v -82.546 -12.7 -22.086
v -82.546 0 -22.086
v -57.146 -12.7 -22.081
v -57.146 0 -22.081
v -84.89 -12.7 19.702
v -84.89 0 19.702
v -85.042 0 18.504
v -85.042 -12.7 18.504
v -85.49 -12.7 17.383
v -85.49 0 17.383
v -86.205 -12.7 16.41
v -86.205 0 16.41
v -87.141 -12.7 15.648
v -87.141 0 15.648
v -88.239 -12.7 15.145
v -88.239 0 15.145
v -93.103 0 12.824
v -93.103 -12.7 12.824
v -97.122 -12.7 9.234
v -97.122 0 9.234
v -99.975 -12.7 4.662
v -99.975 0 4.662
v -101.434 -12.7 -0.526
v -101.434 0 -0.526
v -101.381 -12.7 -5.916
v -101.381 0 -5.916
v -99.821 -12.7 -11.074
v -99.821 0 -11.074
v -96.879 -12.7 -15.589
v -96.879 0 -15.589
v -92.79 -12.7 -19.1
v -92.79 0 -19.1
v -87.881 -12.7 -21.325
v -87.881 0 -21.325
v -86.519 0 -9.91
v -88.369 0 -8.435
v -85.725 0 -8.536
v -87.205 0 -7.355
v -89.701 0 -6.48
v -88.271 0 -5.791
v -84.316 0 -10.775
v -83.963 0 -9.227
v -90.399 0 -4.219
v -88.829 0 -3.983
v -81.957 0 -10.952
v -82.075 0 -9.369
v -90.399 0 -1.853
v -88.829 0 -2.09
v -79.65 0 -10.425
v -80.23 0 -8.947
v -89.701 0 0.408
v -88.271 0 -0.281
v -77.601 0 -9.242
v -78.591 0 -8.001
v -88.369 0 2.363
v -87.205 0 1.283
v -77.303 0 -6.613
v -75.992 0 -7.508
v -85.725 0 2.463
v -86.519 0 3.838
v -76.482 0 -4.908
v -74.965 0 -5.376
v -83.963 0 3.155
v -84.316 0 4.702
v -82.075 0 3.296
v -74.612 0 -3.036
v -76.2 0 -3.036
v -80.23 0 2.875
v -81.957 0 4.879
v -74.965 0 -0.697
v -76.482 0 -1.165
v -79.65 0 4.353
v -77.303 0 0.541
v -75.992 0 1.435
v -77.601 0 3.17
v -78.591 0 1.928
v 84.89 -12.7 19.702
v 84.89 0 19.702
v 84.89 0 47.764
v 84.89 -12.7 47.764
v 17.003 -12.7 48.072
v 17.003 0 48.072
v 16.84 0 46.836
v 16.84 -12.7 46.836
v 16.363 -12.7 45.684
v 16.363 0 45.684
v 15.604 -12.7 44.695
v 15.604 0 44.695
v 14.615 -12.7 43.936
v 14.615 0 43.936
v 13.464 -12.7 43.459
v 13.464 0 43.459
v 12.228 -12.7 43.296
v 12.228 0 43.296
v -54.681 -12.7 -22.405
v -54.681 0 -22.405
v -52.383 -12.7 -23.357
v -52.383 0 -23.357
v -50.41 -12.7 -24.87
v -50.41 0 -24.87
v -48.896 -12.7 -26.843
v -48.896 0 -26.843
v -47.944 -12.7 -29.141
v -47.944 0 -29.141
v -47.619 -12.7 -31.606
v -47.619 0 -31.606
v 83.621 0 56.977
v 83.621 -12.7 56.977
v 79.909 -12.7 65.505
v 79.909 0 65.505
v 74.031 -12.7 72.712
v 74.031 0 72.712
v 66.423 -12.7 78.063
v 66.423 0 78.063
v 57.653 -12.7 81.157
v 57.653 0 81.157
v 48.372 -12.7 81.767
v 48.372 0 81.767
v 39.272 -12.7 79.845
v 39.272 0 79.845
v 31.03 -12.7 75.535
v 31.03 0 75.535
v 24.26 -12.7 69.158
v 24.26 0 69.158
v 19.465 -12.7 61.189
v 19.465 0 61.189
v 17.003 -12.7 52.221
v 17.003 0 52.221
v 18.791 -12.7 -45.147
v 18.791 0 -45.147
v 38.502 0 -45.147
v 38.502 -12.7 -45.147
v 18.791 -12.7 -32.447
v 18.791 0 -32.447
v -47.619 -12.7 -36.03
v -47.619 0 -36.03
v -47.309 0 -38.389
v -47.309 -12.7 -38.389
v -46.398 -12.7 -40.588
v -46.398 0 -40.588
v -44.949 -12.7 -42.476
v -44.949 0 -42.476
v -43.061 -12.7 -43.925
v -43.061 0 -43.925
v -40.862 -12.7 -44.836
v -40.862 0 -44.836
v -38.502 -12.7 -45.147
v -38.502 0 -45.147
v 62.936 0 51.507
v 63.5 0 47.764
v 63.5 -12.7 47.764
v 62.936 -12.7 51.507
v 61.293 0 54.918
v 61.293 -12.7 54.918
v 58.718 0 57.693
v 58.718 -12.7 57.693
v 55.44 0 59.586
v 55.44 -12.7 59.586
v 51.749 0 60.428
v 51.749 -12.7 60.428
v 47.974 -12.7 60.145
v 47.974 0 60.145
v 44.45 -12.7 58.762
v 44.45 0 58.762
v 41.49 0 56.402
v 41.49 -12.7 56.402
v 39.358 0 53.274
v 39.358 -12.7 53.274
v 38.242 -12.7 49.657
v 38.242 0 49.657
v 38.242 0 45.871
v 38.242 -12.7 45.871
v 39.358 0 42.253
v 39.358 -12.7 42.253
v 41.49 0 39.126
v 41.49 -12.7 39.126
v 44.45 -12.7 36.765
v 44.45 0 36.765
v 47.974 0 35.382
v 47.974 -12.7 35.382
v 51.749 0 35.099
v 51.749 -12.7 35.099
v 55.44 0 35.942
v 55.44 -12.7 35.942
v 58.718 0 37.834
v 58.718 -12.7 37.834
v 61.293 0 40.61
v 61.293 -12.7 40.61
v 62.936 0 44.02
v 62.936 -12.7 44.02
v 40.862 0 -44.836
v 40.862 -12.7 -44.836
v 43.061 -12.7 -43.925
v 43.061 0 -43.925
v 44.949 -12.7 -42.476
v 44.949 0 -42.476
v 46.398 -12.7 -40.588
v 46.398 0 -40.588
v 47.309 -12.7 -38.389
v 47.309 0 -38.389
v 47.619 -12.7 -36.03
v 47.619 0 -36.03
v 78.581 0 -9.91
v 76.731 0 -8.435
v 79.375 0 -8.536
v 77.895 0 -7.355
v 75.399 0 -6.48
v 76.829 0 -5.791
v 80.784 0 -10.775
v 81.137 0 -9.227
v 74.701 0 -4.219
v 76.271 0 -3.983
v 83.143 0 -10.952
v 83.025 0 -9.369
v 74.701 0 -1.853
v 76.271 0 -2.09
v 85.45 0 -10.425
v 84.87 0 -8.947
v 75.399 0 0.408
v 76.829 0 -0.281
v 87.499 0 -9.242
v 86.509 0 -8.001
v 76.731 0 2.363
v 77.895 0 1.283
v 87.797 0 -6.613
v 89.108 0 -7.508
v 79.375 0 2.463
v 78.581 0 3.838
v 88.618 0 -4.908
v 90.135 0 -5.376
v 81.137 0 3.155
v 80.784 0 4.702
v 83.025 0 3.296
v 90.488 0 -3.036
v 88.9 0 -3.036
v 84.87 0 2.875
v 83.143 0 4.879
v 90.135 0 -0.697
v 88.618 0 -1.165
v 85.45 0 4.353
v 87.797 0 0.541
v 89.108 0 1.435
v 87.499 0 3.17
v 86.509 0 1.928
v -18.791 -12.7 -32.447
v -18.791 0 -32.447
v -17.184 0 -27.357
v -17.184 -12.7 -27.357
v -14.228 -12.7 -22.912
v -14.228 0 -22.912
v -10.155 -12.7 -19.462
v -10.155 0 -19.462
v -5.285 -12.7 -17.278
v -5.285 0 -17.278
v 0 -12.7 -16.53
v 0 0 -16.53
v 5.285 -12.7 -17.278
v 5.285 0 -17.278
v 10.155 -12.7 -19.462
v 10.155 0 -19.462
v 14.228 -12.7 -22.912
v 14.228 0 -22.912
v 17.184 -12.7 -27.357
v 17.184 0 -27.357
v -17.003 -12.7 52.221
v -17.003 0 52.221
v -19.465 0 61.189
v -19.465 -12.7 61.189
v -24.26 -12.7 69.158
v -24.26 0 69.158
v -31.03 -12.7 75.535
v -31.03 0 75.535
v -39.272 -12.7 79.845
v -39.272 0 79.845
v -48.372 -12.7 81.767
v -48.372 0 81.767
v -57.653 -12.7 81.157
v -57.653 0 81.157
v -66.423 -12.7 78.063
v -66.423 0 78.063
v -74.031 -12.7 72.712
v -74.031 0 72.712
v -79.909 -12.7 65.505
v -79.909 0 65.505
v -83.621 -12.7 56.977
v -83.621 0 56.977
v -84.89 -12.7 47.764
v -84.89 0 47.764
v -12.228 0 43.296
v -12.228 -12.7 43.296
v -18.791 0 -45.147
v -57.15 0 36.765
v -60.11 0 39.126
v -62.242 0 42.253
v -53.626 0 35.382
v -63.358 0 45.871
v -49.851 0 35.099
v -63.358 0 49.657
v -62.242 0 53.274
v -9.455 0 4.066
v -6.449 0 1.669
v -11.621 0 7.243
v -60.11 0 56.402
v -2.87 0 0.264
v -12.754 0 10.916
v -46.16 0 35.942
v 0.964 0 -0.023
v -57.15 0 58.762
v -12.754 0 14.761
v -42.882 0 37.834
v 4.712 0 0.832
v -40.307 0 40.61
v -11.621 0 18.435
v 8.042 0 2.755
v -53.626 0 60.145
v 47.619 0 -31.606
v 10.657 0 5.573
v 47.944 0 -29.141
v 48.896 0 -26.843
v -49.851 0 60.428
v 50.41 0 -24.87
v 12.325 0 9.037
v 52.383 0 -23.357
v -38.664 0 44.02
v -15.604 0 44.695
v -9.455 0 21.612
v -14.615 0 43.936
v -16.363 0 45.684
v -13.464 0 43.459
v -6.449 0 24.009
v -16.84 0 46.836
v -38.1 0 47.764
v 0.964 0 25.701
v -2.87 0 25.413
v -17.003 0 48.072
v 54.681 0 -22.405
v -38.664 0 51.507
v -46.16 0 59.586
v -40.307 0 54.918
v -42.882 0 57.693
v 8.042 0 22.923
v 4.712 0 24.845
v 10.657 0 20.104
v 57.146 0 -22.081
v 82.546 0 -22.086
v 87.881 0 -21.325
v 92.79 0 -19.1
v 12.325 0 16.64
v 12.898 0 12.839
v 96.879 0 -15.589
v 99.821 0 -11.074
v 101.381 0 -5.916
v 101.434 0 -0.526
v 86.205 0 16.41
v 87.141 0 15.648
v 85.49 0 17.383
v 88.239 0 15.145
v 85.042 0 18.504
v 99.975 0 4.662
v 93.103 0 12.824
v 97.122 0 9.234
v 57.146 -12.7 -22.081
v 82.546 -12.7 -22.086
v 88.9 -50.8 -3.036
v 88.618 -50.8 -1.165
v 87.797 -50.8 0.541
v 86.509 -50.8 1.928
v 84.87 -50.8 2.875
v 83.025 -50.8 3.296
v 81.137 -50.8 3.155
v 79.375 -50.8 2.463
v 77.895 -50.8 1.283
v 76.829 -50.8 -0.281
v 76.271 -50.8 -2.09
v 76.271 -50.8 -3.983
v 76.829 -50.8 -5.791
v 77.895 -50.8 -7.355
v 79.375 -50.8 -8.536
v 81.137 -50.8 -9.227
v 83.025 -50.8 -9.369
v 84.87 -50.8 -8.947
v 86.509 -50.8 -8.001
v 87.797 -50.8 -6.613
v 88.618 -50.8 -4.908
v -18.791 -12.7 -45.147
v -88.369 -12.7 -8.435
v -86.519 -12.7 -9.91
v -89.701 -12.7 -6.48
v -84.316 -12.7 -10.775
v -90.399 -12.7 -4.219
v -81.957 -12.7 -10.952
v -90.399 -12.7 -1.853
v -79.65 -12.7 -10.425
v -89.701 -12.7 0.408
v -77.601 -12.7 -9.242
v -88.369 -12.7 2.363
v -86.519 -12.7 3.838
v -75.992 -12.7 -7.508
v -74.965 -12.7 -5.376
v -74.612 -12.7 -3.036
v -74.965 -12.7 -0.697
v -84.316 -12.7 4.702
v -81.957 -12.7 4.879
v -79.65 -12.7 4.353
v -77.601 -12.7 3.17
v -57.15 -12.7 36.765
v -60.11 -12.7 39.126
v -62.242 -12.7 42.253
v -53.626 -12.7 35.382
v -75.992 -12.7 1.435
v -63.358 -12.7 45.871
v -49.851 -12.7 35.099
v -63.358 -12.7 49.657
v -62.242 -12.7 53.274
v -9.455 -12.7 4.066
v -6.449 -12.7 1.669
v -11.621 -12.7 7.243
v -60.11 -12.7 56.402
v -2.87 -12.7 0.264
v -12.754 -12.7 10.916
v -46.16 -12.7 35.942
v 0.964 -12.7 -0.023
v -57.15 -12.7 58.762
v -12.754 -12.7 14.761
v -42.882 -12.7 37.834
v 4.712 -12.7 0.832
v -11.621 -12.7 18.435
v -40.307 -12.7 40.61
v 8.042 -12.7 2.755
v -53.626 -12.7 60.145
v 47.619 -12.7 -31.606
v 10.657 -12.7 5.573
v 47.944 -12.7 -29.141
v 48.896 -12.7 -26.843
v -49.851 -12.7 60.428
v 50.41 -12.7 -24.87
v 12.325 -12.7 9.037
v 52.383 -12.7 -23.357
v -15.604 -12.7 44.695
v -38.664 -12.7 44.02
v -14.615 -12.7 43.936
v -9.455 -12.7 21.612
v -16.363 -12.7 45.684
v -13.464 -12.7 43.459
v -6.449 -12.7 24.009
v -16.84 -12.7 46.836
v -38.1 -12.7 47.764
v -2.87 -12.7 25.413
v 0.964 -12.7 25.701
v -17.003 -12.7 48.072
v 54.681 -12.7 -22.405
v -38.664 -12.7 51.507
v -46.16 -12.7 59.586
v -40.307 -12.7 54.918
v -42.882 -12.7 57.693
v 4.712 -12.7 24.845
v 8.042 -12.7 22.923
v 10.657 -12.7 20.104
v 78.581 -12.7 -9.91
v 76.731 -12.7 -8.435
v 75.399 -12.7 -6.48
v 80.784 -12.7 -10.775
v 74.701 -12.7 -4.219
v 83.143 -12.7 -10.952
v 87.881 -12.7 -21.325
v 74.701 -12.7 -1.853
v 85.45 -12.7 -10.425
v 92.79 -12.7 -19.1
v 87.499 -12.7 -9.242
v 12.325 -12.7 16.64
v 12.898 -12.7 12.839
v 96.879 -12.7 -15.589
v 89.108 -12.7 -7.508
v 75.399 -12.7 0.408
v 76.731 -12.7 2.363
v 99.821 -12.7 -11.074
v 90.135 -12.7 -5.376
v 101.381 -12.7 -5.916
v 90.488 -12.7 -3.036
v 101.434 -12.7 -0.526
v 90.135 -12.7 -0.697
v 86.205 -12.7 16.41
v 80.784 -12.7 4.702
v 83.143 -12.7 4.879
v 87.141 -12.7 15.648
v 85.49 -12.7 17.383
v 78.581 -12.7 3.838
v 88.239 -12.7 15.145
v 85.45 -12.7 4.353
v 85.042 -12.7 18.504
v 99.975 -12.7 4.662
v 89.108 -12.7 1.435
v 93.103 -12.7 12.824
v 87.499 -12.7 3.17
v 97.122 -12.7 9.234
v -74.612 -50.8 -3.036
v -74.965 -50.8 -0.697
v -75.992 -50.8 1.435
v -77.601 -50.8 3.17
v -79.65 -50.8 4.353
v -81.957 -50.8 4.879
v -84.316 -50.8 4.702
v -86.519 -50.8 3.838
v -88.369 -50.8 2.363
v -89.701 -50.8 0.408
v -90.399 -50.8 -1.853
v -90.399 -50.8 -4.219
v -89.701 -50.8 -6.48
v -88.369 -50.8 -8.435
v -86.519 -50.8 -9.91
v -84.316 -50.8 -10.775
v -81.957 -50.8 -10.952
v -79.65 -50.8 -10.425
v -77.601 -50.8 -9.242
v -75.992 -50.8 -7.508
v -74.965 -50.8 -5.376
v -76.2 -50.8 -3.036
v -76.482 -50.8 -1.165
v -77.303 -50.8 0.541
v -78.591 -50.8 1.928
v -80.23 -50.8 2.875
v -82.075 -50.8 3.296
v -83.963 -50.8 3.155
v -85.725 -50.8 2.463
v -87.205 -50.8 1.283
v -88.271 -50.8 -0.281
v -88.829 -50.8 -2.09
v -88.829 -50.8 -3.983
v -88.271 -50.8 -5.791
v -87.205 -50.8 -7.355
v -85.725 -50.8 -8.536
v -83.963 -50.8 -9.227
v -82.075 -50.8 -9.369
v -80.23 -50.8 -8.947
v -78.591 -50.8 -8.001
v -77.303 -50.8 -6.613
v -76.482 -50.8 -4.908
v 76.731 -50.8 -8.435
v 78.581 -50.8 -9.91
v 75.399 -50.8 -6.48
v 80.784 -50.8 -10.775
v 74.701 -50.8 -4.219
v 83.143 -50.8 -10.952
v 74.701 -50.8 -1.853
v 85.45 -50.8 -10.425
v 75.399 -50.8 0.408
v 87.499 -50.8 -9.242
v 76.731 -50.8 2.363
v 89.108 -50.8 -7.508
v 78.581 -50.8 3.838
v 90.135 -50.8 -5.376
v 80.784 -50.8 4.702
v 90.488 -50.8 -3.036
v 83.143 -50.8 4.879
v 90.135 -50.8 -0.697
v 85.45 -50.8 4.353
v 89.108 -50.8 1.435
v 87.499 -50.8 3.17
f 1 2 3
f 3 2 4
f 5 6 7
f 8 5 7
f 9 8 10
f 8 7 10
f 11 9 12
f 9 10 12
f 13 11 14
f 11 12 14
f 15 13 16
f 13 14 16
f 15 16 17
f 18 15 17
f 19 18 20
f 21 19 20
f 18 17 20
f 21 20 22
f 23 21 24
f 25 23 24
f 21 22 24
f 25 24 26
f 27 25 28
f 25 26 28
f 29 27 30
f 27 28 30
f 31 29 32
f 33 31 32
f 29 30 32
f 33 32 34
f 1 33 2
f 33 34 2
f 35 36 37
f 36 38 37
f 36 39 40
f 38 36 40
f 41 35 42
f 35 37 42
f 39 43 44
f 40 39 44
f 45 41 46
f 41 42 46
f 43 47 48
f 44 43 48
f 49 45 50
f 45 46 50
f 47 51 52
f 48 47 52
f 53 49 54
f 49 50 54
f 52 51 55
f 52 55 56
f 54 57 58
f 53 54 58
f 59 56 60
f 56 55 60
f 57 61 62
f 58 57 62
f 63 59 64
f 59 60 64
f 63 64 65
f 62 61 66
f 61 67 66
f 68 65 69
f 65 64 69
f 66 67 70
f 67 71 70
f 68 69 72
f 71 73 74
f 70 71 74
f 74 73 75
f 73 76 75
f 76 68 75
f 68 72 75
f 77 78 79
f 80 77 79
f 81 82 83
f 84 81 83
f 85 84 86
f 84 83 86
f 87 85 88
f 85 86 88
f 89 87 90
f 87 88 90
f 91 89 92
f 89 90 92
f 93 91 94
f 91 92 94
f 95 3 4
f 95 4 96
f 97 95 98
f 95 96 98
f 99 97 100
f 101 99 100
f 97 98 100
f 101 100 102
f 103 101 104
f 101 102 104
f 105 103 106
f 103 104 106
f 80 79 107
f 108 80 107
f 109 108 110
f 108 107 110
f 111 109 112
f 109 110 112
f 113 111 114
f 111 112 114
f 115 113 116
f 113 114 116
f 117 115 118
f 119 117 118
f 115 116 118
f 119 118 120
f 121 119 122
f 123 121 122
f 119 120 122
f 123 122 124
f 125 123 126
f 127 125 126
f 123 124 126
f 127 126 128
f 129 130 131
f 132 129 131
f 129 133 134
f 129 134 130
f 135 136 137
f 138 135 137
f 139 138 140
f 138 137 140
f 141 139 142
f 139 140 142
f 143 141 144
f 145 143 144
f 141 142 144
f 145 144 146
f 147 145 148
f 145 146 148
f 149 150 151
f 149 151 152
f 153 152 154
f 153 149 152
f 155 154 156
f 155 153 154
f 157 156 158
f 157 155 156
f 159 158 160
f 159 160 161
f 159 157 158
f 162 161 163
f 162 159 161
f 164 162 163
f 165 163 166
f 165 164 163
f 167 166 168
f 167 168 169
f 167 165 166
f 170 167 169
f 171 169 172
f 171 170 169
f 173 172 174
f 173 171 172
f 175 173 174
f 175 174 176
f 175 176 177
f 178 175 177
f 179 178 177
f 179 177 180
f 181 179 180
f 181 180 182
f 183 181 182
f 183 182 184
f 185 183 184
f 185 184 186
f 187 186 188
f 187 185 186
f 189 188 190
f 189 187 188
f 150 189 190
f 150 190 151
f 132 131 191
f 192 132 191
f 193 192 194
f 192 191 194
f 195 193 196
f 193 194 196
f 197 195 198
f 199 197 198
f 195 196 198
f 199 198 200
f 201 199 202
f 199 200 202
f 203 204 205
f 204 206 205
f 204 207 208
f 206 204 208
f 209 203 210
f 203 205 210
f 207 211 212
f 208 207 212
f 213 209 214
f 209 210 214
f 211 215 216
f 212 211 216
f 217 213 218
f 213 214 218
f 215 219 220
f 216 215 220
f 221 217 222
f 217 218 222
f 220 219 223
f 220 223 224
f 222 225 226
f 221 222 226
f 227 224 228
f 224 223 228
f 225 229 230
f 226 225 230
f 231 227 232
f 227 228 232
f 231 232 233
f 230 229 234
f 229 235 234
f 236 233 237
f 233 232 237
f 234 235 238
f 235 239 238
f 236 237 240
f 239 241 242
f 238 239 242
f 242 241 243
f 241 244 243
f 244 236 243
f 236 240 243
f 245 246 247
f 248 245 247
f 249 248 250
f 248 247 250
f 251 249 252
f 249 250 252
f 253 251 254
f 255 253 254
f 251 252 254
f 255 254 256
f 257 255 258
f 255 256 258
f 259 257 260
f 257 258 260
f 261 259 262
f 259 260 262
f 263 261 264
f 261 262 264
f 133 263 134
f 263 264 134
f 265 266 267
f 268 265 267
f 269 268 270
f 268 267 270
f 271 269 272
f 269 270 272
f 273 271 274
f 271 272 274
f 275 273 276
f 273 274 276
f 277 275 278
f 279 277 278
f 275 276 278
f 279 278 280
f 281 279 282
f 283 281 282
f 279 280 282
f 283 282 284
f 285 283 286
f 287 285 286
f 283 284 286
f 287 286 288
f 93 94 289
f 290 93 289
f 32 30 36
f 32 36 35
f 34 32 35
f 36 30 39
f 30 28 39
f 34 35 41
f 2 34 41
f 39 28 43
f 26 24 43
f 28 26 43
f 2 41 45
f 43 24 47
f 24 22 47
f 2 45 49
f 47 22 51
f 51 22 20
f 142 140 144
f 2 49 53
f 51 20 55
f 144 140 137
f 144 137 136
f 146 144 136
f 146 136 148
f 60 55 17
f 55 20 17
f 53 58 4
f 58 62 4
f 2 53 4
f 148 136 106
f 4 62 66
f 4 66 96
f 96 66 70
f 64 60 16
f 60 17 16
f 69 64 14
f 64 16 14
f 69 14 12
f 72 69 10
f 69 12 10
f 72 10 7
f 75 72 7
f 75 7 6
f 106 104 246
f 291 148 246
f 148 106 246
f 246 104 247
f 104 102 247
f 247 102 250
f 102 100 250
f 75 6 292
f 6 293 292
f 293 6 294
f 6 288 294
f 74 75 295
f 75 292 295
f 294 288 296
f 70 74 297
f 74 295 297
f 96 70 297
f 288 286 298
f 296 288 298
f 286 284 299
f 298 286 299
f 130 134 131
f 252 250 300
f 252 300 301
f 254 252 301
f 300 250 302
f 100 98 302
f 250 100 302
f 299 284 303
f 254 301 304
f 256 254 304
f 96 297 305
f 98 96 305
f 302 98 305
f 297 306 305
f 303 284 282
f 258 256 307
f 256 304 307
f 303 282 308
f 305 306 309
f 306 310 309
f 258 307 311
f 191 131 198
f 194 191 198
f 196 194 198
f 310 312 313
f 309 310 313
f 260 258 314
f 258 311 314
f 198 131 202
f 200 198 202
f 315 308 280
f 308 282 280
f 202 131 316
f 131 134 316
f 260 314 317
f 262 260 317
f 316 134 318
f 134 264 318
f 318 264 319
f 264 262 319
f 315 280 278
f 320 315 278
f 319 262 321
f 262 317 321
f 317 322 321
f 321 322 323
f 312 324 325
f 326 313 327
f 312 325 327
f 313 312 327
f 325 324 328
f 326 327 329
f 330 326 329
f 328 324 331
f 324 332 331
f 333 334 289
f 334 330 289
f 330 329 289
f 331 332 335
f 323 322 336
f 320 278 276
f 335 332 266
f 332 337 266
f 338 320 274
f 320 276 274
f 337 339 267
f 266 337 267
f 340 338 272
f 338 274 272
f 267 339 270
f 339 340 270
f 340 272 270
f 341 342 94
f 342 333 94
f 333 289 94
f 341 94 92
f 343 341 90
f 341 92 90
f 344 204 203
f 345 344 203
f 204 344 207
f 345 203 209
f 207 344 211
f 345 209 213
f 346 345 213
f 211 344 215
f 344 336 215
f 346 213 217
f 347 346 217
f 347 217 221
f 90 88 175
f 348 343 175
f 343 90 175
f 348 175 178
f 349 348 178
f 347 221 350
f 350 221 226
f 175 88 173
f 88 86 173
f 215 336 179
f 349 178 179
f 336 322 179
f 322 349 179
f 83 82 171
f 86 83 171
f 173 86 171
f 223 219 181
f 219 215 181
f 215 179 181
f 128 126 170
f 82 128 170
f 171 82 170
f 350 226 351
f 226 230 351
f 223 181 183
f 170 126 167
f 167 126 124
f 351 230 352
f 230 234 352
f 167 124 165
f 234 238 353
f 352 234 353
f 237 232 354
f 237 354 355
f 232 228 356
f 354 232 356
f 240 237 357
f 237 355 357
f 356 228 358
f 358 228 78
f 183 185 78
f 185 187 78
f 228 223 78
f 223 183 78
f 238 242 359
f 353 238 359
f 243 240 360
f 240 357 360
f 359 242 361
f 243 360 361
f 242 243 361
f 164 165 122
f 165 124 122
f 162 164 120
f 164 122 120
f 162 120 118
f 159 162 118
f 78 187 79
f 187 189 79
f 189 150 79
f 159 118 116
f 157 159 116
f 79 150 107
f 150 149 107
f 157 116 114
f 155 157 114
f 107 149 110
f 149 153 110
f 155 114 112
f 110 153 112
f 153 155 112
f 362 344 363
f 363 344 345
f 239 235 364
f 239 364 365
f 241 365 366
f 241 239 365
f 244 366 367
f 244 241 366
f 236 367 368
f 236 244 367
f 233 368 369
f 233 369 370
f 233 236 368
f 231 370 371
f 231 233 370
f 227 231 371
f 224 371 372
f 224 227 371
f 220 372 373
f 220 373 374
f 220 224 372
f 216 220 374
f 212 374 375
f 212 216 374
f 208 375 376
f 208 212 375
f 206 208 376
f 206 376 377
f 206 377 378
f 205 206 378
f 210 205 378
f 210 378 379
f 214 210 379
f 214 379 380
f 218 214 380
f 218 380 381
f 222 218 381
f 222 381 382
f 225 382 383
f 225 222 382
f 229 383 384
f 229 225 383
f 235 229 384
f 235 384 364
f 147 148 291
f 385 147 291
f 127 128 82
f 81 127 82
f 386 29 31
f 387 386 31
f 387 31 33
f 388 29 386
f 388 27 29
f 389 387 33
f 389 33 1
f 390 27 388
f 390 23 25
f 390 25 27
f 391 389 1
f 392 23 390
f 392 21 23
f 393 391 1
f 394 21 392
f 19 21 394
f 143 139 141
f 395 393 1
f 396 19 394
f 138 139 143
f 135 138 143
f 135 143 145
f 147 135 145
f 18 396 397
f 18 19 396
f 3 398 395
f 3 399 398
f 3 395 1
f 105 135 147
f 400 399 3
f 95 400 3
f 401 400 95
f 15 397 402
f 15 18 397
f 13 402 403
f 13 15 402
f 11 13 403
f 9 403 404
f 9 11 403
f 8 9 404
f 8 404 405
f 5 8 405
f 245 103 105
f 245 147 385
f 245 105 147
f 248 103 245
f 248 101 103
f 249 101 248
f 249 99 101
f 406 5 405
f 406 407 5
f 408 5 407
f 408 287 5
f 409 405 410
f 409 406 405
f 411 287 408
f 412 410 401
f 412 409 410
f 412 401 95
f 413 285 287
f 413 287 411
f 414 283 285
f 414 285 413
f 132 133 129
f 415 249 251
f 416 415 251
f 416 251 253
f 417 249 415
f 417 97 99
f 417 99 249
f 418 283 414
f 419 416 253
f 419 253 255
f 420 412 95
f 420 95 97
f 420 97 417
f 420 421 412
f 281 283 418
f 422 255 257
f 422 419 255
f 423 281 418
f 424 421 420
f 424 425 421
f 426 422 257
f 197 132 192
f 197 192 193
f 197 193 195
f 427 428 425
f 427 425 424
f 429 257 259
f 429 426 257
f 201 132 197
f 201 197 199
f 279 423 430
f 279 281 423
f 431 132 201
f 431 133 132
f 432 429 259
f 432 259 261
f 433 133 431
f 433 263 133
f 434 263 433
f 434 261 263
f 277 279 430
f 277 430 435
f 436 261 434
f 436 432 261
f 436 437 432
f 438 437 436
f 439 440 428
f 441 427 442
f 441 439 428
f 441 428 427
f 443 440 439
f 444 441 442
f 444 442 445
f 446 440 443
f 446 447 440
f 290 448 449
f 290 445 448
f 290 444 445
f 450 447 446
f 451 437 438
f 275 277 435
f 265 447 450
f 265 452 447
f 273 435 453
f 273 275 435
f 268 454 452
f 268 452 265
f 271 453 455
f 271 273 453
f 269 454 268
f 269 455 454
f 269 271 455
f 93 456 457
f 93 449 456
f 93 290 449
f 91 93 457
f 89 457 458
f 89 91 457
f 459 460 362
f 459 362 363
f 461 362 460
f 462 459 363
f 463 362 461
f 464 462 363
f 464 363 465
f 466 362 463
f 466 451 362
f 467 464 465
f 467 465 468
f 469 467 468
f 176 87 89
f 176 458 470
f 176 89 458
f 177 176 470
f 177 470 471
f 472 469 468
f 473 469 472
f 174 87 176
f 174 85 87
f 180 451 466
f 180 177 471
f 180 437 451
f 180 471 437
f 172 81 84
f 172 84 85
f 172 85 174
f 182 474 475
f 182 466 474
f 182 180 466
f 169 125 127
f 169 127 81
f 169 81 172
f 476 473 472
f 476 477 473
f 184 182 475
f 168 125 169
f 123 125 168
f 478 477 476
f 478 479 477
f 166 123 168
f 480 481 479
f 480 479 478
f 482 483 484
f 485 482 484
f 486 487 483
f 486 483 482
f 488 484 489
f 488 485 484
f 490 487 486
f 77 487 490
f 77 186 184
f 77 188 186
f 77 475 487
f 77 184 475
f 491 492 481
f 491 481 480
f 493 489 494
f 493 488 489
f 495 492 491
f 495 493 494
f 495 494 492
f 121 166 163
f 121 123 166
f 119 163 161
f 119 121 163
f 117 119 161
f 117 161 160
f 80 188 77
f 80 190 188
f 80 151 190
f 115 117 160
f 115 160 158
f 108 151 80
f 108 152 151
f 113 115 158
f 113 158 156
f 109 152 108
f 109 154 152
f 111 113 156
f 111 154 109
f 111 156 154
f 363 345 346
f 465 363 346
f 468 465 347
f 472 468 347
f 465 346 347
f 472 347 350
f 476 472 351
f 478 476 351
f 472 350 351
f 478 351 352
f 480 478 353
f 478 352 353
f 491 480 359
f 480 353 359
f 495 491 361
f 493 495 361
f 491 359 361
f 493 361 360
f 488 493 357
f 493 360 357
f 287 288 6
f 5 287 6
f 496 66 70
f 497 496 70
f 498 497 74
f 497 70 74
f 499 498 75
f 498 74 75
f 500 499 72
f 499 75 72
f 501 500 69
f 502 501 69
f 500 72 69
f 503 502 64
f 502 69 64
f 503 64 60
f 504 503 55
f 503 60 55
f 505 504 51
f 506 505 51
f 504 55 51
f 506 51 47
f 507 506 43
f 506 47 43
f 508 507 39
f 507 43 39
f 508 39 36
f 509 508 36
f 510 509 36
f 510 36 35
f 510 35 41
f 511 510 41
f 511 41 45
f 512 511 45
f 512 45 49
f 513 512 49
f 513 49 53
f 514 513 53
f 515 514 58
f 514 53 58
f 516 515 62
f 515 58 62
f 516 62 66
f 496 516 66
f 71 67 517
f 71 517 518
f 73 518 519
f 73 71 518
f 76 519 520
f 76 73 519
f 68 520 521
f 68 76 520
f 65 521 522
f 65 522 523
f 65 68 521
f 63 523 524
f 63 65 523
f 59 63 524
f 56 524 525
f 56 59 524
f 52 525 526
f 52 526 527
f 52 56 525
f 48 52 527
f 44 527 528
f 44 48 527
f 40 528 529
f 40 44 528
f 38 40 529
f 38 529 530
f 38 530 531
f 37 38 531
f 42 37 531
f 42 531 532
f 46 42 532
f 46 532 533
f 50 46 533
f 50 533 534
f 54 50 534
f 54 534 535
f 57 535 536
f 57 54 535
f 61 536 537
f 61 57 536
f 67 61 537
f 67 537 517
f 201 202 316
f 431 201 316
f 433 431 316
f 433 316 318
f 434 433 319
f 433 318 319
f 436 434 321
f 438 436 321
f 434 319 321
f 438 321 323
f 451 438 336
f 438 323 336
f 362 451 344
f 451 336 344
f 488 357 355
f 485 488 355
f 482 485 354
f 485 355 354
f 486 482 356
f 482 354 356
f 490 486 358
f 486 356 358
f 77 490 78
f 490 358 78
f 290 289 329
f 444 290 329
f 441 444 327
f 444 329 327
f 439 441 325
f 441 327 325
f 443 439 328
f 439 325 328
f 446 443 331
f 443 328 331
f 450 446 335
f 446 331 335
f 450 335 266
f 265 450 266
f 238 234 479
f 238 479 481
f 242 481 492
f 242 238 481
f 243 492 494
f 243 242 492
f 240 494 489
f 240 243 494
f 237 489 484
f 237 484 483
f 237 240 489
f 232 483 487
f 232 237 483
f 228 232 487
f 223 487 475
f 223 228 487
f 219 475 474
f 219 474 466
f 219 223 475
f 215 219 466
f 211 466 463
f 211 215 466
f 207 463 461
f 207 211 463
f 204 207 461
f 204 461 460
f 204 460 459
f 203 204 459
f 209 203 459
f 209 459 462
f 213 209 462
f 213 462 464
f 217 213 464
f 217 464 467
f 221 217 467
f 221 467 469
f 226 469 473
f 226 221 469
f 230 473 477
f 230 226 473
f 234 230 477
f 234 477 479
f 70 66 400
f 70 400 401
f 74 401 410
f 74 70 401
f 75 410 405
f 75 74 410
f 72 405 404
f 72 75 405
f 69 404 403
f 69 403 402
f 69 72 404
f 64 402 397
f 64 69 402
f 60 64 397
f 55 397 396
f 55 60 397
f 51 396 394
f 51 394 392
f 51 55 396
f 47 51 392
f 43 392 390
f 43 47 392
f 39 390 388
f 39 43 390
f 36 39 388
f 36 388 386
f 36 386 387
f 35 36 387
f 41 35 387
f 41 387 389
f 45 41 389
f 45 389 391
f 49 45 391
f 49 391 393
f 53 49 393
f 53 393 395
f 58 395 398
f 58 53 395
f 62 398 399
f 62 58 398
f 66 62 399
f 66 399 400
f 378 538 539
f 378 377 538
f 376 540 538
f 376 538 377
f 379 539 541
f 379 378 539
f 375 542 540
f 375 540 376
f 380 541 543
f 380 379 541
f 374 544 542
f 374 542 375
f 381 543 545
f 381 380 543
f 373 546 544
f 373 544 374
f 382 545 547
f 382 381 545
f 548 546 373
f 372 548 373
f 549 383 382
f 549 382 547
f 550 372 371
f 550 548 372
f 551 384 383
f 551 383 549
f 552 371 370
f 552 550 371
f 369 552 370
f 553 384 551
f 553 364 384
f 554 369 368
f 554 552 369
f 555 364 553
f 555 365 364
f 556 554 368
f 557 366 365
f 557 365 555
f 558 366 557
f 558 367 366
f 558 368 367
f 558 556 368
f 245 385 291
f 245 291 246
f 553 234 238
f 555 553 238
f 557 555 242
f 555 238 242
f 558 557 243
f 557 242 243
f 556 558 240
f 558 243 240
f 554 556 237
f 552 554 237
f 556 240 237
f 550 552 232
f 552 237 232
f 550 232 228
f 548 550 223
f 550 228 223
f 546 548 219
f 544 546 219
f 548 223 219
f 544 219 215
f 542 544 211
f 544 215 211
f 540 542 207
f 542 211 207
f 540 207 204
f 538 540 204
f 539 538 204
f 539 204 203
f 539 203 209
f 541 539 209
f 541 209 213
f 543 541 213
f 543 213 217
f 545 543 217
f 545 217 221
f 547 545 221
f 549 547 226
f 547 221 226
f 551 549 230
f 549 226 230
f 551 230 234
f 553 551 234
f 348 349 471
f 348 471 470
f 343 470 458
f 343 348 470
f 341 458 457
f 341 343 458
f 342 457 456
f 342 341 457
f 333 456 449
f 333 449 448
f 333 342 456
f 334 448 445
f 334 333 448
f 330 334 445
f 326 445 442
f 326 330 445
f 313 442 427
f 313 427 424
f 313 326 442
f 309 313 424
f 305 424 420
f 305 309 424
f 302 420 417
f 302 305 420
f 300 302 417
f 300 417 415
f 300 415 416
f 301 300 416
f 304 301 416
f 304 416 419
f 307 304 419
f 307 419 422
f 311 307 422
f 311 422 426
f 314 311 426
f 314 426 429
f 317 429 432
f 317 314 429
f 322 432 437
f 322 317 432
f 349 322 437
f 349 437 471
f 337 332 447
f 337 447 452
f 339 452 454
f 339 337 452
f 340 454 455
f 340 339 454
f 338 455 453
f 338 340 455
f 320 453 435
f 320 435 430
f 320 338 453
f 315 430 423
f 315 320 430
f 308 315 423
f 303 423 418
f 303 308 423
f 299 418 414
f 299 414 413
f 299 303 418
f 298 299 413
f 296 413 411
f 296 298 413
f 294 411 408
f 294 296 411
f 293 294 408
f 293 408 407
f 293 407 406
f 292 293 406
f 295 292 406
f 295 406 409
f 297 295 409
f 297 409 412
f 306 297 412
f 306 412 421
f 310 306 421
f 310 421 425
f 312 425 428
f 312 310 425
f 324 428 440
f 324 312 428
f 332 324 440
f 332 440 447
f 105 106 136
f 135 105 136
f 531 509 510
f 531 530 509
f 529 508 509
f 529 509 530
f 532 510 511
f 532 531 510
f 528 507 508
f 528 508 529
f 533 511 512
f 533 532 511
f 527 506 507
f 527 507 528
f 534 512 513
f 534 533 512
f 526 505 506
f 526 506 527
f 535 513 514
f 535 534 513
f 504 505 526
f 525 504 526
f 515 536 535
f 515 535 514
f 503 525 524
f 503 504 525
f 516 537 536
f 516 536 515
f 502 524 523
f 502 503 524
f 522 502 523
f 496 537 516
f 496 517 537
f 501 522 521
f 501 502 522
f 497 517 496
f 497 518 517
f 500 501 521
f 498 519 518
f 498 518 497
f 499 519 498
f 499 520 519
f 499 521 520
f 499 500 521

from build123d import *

# Parameters (mm, degrees)
F0_R     = 7.9375
F0_R_2   = 6.35
F1_DEPTH = 50.8
F2_DEPTH = 50.8
F0_R_3   = 12.89792
F0_R_4   = 12.7
F3_DEPTH = 12.7


with BuildPart() as f1:
    # F0 (on Front) → F1 (new body)
    with BuildSketch(Plane.XZ):
        with Locations((82.55, -3.036259)):
            Circle(F0_R)
        with Locations((82.55, -3.036259)):
            Circle(F0_R_2, mode=Mode.SUBTRACT)
    extrude(amount=F1_DEPTH)


with BuildPart() as f2:
    # F0 (on Front) → F2 (new body)
    with BuildSketch(Plane.XZ):
        with Locations((-82.55, -3.036259)):
            Circle(F0_R)
        with Locations((-82.55, -3.036259)):
            Circle(F0_R_2, mode=Mode.SUBTRACT)
    extrude(amount=F2_DEPTH)


with BuildPart() as f3:
    # F0 (on Front) → F3 (new body)
    with BuildSketch(Plane.XZ):
        with BuildLine():
            ThreePointArc((84.889529, 47.763741), (53.033181, 81.780044), (17.003059, 52.220508))
            Line((17.003059, 52.220508), (17.003059, 48.071559))
            ThreePointArc((17.003059, 48.071559), (15.604436, 44.694983), (12.227859, 43.296359))
            Line((12.227859, 43.296359), (-12.227859, 43.296359))
            ThreePointArc((-12.227859, 43.296359), (-15.604436, 44.694983), (-17.003059, 48.071559))
            Line((-17.003059, 48.071559), (-17.003059, 52.220508))
            ThreePointArc((-17.003059, 52.220508), (-53.033181, 81.780044), (-84.889529, 47.763741))
            Line((-84.889529, 47.763741), (-84.889529, 19.701832))
            ThreePointArc((-84.889529, 19.701832), (-85.81688, 16.874007), (-88.238749, 15.144518))
            ThreePointArc((-88.238749, 15.144518), (-101.381152, -5.91553), (-82.546187, -22.086258))
            Line((-82.546187, -22.086258), (-57.146187, -22.081174))
            ThreePointArc((-57.146187, -22.081174), (-50.409763, -24.870308), (-47.619281, -31.606174))
            Line((-47.619281, -31.606174), (-47.619281, -36.029856))
            ThreePointArc((-47.619281, -36.029856), (-44.94901, -42.47646), (-38.502407, -45.14673))
            Line((-38.502407, -45.14673), (-18.790584, -45.14673))
            Line((-18.790584, -45.14673), (-18.790584, -32.44673))
            ThreePointArc((-18.790584, -32.44673), (0, -16.52985), (18.790584, -32.44673))
            Line((18.790584, -32.44673), (18.790584, -45.14673))
            Line((18.790584, -45.14673), (38.502407, -45.14673))
            ThreePointArc((38.502407, -45.14673), (44.94901, -42.47646), (47.619281, -36.029856))
            Line((47.619281, -36.029856), (47.619281, -31.606174))
            ThreePointArc((47.619281, -31.606174), (50.409763, -24.870308), (57.146187, -22.081174))
            Line((57.146187, -22.081174), (82.546187, -22.086258))
            ThreePointArc((82.546187, -22.086258), (101.381152, -5.91553), (88.238749, 15.144518))
            ThreePointArc((88.238749, 15.144518), (85.81688, 16.874007), (84.889529, 19.701832))
            Line((84.889529, 19.701832), (84.889529, 47.763741))
        make_face()
        with Locations((-82.55, -3.036259)):
            Circle(F0_R, mode=Mode.SUBTRACT)
        with Locations((0, 12.838741)):
            Circle(F0_R_3, mode=Mode.SUBTRACT)
        with Locations((82.55, -3.036259)):
            Circle(F0_R, mode=Mode.SUBTRACT)
        with Locations((-50.8, 47.763741)):
            Circle(F0_R_4, mode=Mode.SUBTRACT)
        with Locations((50.8, 47.763741)):
            Circle(F0_R_4, mode=Mode.SUBTRACT)
    extrude(amount=F3_DEPTH)


solid = Compound([f1.part, f2.part, f3.part])
